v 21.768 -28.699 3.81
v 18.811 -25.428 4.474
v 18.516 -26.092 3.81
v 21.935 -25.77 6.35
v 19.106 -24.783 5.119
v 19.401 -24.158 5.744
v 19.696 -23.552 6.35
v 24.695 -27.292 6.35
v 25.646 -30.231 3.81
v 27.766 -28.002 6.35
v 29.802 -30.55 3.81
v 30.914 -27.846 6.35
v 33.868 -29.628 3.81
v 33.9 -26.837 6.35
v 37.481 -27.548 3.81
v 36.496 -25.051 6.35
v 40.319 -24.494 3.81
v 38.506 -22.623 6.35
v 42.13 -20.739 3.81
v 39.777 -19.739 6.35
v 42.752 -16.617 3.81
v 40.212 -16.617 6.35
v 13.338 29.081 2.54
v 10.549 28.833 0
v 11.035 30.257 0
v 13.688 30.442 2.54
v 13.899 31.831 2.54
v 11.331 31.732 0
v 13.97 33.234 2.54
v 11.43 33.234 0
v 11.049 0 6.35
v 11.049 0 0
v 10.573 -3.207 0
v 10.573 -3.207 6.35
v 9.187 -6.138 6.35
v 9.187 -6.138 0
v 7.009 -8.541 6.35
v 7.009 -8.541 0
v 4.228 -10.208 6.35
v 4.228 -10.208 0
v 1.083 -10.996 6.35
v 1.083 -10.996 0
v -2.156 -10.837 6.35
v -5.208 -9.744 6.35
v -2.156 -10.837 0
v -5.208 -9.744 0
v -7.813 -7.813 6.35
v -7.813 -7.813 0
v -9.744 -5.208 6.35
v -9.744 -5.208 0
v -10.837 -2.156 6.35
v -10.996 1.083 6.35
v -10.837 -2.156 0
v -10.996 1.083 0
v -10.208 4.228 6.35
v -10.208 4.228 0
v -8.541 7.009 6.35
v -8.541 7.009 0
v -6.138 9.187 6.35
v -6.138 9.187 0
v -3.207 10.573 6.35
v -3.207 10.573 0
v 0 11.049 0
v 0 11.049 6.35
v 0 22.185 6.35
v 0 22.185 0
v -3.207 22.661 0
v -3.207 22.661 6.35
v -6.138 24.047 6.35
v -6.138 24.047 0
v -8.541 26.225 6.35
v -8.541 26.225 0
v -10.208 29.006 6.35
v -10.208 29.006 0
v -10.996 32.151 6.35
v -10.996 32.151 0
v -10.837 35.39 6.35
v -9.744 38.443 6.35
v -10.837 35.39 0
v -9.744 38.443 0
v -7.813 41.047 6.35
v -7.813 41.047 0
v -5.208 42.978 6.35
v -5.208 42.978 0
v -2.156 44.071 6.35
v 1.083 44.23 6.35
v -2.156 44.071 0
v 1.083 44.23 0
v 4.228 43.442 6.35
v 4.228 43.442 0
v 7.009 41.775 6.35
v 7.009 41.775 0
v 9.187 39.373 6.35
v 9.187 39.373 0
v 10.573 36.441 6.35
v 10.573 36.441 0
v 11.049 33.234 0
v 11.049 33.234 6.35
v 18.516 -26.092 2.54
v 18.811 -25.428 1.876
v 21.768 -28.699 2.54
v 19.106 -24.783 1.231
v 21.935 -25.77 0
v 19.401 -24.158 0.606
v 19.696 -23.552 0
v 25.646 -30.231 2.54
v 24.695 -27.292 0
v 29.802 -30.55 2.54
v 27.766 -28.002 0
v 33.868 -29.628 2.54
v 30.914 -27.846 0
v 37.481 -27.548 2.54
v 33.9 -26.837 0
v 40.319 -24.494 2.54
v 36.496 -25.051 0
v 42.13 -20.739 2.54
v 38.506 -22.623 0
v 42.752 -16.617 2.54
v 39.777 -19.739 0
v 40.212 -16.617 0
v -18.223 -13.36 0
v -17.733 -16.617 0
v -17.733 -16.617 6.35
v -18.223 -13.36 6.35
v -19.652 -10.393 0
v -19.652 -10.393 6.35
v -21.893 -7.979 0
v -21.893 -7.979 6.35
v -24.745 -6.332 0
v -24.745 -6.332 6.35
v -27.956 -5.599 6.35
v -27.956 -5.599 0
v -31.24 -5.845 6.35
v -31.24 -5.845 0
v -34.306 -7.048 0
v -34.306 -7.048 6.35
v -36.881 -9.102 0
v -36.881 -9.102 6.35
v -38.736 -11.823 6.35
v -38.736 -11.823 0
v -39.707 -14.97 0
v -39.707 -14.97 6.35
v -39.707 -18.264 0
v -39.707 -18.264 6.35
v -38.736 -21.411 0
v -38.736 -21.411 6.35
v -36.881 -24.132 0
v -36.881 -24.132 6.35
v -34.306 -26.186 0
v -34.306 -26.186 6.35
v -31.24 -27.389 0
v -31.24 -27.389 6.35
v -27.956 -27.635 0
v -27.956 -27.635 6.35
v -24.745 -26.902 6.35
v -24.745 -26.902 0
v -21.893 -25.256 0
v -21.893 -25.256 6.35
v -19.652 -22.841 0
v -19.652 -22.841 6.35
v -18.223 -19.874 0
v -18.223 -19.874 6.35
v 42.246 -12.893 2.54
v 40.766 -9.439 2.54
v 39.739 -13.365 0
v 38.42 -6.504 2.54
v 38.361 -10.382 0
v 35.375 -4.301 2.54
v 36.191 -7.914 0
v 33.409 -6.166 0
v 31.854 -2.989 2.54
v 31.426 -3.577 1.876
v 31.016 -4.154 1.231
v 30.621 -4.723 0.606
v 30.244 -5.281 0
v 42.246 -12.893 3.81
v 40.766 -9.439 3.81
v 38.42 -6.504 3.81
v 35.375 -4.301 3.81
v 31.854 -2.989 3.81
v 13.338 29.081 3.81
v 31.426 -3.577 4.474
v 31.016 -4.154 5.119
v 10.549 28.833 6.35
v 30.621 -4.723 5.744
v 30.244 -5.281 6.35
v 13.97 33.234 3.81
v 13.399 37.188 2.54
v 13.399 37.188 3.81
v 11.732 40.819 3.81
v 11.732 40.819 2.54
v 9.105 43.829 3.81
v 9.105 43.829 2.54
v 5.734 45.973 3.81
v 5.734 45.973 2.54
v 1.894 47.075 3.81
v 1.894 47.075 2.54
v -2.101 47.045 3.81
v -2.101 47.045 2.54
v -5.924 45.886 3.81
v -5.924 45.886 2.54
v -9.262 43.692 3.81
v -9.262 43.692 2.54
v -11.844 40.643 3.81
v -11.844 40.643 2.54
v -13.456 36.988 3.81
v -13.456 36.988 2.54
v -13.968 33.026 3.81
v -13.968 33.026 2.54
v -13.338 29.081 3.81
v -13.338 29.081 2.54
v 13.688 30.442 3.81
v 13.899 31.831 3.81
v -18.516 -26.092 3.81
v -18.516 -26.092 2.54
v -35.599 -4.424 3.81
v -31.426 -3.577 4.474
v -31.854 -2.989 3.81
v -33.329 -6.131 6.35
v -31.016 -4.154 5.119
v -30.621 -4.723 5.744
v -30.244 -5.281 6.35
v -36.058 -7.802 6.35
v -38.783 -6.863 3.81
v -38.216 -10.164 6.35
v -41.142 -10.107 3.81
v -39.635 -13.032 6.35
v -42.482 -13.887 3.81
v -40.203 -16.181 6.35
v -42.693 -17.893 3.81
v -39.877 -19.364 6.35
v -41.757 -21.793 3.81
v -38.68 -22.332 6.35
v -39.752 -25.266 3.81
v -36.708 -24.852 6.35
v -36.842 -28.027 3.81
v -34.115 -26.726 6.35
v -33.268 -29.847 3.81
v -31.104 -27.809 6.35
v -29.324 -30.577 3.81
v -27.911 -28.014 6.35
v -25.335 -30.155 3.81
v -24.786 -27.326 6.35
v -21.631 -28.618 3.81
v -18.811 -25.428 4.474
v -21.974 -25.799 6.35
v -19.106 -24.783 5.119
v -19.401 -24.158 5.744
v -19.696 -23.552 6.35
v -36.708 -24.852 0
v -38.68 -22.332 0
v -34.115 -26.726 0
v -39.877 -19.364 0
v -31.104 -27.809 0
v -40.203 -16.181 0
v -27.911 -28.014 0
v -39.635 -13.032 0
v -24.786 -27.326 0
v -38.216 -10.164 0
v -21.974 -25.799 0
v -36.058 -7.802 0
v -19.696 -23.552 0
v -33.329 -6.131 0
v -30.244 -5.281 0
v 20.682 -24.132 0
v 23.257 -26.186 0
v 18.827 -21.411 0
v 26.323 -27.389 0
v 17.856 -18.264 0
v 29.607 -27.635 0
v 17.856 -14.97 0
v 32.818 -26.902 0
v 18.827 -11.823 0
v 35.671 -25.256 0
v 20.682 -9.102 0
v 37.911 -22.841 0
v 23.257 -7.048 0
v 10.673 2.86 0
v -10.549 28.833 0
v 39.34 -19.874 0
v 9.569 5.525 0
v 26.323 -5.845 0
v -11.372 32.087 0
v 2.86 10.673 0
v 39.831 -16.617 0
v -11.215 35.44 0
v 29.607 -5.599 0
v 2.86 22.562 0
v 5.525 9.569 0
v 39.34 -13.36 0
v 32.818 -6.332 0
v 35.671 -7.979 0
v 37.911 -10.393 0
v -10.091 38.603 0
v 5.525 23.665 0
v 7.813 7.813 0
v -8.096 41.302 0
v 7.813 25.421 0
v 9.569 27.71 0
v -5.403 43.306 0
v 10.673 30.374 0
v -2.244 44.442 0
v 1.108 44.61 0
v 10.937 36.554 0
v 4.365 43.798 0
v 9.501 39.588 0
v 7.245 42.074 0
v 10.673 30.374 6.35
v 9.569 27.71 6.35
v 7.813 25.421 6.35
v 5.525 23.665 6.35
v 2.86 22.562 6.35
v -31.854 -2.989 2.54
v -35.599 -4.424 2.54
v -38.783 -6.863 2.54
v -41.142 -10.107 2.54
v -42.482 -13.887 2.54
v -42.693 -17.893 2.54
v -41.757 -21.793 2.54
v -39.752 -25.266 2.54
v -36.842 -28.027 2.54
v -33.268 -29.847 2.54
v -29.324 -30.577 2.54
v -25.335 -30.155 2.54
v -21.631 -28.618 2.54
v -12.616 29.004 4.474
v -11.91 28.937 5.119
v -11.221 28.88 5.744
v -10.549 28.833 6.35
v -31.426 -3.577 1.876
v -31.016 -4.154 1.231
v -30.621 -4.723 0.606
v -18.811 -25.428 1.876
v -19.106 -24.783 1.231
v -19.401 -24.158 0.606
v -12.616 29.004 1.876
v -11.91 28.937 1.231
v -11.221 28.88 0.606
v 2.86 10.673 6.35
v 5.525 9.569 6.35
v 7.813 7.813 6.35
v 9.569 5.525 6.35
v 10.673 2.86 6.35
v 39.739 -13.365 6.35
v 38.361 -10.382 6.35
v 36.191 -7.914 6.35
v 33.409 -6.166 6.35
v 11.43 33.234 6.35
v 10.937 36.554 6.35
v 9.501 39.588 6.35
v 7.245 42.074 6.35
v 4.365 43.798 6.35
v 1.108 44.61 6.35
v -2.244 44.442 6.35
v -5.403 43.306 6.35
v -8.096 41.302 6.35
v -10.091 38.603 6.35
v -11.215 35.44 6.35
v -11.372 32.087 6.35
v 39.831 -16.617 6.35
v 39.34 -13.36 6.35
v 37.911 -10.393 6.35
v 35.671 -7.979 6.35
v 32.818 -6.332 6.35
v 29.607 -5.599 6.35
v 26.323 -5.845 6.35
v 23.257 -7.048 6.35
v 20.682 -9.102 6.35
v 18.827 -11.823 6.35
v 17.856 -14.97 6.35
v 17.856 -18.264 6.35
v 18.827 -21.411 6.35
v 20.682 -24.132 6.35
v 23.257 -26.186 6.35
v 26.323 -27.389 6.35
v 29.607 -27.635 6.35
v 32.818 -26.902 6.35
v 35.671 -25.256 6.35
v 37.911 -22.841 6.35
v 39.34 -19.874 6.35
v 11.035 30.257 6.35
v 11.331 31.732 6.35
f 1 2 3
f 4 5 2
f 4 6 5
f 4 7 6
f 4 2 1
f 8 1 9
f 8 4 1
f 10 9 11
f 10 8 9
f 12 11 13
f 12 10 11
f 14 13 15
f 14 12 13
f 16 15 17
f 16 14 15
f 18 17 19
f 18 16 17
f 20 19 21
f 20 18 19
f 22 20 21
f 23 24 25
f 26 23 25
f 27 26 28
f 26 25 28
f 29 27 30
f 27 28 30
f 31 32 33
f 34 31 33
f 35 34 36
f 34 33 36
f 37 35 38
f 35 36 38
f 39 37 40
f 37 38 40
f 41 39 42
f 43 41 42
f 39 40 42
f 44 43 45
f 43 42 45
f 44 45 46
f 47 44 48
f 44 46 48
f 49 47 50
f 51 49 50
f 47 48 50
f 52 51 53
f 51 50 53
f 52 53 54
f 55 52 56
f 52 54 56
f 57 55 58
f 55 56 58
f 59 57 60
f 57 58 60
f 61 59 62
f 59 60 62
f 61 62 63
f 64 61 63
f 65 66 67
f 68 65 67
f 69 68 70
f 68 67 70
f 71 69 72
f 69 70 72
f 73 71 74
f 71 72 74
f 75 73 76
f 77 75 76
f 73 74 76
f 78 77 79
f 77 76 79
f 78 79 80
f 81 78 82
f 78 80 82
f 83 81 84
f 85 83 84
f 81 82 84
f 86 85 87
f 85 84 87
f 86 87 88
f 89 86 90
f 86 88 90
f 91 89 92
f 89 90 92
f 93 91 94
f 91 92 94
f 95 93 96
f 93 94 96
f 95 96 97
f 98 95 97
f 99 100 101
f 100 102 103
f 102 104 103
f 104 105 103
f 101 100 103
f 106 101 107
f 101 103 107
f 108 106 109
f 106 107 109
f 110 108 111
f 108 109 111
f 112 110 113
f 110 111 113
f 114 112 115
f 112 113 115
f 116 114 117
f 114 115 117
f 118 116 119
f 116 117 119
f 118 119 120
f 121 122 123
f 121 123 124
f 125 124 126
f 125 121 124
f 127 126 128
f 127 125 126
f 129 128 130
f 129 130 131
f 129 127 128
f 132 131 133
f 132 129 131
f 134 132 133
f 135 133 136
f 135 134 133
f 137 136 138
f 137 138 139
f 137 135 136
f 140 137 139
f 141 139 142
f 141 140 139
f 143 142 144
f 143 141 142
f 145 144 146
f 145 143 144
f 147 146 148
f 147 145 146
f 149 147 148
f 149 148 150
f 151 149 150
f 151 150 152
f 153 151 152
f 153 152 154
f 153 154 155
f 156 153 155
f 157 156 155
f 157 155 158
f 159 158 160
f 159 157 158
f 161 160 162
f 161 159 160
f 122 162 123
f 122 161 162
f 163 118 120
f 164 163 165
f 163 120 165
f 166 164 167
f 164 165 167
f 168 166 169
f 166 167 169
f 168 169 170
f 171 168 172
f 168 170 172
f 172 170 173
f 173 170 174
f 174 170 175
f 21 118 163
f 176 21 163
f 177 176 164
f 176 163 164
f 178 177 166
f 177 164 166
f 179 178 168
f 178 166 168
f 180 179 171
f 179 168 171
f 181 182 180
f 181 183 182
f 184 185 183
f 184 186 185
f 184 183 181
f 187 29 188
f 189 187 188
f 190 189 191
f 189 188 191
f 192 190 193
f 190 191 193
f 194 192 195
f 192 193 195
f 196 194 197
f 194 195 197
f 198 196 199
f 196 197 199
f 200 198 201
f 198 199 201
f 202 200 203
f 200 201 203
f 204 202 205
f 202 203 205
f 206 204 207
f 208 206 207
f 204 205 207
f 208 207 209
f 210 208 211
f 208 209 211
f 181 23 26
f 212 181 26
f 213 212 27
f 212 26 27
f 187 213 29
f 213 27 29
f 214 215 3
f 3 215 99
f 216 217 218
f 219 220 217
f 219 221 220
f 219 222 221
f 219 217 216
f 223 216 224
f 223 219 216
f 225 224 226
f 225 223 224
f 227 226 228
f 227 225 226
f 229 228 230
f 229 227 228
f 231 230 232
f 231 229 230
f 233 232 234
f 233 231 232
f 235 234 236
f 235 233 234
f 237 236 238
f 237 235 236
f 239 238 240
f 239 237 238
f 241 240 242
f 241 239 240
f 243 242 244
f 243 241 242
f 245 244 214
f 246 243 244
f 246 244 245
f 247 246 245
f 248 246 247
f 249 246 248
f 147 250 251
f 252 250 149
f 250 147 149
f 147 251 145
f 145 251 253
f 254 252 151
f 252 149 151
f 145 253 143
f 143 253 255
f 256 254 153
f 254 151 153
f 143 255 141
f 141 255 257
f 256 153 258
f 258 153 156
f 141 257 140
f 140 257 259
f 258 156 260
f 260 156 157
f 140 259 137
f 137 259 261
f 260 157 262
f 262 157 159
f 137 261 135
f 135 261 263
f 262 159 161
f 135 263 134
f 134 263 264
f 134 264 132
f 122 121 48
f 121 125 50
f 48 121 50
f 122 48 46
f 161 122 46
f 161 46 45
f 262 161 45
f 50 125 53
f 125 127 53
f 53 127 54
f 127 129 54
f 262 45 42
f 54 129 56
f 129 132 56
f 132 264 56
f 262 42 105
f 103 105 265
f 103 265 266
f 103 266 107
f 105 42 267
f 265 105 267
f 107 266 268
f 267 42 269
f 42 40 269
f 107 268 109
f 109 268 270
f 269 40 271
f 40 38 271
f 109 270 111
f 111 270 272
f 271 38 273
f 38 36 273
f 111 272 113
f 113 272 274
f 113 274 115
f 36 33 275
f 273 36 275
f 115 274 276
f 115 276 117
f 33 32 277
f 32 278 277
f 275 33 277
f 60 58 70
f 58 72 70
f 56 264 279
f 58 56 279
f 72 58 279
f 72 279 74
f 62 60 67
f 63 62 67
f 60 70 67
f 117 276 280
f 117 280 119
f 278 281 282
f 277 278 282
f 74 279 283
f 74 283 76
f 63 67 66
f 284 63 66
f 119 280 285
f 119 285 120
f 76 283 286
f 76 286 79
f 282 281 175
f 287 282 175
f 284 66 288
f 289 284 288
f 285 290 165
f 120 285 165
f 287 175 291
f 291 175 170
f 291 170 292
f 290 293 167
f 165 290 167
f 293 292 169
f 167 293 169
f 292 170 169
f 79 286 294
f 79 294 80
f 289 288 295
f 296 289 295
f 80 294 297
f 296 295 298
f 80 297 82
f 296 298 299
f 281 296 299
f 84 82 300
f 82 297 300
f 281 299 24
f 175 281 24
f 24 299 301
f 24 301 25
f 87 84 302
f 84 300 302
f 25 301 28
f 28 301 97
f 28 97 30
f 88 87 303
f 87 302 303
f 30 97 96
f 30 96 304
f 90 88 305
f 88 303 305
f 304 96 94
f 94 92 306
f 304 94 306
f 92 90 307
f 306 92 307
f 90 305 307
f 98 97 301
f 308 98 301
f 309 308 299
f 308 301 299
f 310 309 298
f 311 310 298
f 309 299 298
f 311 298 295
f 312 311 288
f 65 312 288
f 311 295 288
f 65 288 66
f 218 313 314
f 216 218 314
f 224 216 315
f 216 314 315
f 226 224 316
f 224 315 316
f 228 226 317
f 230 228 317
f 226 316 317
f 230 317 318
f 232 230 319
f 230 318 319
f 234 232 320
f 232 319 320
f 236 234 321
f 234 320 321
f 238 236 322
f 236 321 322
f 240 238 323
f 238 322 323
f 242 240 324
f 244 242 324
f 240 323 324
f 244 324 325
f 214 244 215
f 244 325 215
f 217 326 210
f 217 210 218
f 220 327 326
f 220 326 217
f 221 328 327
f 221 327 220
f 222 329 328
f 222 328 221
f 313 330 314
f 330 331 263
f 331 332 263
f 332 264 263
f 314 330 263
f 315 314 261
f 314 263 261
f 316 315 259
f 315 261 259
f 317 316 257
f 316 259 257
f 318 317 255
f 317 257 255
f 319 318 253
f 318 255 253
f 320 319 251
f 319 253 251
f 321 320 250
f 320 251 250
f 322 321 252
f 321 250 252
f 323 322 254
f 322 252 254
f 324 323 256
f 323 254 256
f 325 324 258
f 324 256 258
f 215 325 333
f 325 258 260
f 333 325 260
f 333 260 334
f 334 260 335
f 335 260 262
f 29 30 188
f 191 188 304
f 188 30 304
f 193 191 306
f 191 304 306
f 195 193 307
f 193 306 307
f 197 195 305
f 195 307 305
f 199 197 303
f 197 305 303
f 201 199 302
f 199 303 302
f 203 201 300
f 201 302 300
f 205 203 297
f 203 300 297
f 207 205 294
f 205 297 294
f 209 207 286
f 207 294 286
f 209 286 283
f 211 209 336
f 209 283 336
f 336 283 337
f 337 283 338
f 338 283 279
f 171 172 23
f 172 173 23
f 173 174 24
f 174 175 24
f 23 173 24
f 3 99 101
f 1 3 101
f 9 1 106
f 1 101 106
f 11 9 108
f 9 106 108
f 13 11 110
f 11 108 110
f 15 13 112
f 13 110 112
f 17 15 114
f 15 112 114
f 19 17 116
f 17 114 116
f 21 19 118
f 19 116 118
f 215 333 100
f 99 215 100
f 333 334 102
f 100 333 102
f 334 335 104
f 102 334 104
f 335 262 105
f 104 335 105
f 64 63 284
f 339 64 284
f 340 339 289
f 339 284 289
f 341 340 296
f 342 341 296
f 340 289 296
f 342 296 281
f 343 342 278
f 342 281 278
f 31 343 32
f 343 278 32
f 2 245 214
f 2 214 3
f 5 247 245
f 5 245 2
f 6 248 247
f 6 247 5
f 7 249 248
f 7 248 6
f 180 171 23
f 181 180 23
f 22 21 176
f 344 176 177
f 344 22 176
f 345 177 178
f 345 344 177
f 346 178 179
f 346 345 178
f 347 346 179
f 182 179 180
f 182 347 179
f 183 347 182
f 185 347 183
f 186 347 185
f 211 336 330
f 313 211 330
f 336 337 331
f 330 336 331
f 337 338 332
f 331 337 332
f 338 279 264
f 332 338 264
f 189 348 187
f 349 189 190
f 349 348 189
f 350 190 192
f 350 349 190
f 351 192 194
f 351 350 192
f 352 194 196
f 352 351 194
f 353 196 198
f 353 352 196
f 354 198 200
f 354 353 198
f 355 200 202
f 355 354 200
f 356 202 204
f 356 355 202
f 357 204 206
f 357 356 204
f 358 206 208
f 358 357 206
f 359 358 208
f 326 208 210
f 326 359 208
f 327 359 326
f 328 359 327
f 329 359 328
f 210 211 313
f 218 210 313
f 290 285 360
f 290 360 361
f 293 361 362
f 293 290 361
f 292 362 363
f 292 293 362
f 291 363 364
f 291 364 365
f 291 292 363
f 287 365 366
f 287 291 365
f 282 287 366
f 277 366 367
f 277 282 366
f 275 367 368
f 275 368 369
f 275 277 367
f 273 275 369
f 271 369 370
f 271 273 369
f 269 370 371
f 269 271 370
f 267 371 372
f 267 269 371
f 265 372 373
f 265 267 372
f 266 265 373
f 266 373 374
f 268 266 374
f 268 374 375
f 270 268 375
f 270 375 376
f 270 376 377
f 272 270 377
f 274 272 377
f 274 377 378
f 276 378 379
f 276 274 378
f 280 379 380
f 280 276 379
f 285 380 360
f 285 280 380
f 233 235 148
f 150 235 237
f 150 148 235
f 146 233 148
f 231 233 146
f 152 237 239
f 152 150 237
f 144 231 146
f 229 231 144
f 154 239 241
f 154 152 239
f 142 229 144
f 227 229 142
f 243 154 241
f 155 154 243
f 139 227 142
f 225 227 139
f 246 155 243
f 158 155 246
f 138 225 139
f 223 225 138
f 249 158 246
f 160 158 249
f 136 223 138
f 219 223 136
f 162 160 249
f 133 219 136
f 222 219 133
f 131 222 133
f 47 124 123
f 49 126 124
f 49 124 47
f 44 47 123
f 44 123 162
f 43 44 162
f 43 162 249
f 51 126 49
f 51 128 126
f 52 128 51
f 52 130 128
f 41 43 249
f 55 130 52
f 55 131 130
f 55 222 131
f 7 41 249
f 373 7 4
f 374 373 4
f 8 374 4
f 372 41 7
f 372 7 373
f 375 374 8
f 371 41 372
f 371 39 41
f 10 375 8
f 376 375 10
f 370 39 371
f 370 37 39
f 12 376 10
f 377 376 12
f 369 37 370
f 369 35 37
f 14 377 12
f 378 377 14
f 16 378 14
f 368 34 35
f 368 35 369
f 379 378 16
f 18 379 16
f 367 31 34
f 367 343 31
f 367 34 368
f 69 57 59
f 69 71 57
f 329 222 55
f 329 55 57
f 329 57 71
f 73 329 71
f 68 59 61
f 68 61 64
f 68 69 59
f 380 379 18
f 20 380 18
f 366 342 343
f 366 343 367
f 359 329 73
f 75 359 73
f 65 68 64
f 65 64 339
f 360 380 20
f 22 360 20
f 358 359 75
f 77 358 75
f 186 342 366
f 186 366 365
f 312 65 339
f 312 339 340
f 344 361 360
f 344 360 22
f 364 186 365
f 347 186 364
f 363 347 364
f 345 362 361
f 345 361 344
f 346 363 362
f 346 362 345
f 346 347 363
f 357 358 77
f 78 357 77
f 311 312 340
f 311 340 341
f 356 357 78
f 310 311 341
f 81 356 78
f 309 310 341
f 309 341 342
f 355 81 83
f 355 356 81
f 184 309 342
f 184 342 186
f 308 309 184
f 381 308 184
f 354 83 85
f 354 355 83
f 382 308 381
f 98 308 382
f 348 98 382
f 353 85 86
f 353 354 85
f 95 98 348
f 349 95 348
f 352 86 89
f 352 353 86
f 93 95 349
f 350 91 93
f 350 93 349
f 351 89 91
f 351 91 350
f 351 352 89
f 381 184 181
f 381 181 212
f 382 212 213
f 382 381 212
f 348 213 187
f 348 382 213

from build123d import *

# Parameters (mm, degrees)
F0_R     = 11.049
F1_DEPTH = 6.35
F2_SIZE  = 2.54
F3_DEPTH = 6.35


with BuildPart() as f1:
    # F0 (on Top) → F1 (new body)
    with BuildSketch(Plane.XY):
        with BuildLine():
            ThreePointArc((0, 11.049), (-7.812823, -7.812823), (11.049, 0))
            ThreePointArc((11.049, 0), (7.812823, 7.812823), (0, 11.049))
        make_face()
        with BuildLine():
            ThreePointArc((13.97, 0), (9.878282, 9.878282), (0, 13.97))
            ThreePointArc((0, 13.97), (-9.878282, -9.878282), (13.97, 0))
        make_face()
        with BuildLine():
            ThreePointArc((0, 11.049), (7.812823, 7.812823), (11.049, 0))
            ThreePointArc((11.049, 0), (-7.812823, -7.812823), (0, 11.049))
        make_face(mode=Mode.SUBTRACT)
        with BuildLine():
            ThreePointArc((13.338323, 29.080812), (8.280673, 21.982845), (0, 19.264128))
            ThreePointArc((0, 19.264128), (-8.280673, 21.982845), (-13.338323, 29.080812))
            ThreePointArc((-13.338323, 29.080812), (-15.574662, 8.992035), (-31.853884, -2.989079))
            ThreePointArc((-31.853884, -2.989079), (-20.05689, -5.706502), (-14.811599, -16.617064))
            ThreePointArc((-14.811599, -16.617064), (-15.770499, -21.703533), (-18.51556, -26.091733))
            ThreePointArc((-18.51556, -26.091733), (0, -17.984071), (18.51556, -26.091733))
            ThreePointArc((18.51556, -26.091733), (16.683224, -9.632064), (31.853884, -2.989079))
            ThreePointArc((31.853884, -2.989079), (15.574662, 8.992035), (13.338323, 29.080812))
        make_face()
        with BuildLine():
            ThreePointArc((13.97, 0), (-9.878282, -9.878282), (0, 13.97))
            ThreePointArc((0, 13.97), (9.878282, 9.878282), (13.97, 0))
        make_face(mode=Mode.SUBTRACT)
        with BuildLine():
            ThreePointArc((11.049, 33.234128), (-7.812823, 41.046951), (0, 22.185128))
            ThreePointArc((0, 22.185128), (7.812823, 25.421305), (11.049, 33.234128))
        make_face()
        with BuildLine():
            ThreePointArc((-13.338323, 29.080812), (-8.280673, 21.982845), (0, 19.264128))
            ThreePointArc((0, 19.264128), (8.280673, 21.982845), (13.338323, 29.080812))
            ThreePointArc((13.338323, 29.080812), (13.811178, 31.133589), (13.97, 33.234128))
            ThreePointArc((13.97, 33.234128), (-2.100538, 47.045306), (-13.338323, 29.080812))
        make_face()
        with BuildLine():
            ThreePointArc((11.049, 33.234128), (7.812823, 25.421305), (0, 22.185128))
            ThreePointArc((0, 22.185128), (-7.812823, 41.046951), (11.049, 33.234128))
        make_face(mode=Mode.SUBTRACT)
        with BuildLine():
            ThreePointArc((-31.853884, -2.989079), (-15.574662, 8.992035), (-13.338323, 29.080812))
            Line((-13.338323, 29.080812), (-31.853884, -2.989079))
        make_face()
        with BuildLine():
            Line((31.853884, -2.989079), (13.338323, 29.080812))
            ThreePointArc((13.338323, 29.080812), (15.574662, 8.992035), (31.853884, -2.989079))
        make_face()
        with BuildLine():
            ThreePointArc((-14.811599, -16.617064), (-20.05689, -5.706502), (-31.853884, -2.989079))
            ThreePointArc((-31.853884, -2.989079), (-40.879974, -23.602064), (-18.51556, -26.091733))
            ThreePointArc((-18.51556, -26.091733), (-15.770499, -21.703533), (-14.811599, -16.617064))
        make_face()
        with Locations((-28.781599, -16.617064)):
            Circle(F0_R, mode=Mode.SUBTRACT)
        with BuildLine():
            ThreePointArc((42.751599, -16.617064), (39.692161, -7.892355), (31.853884, -2.989079))
            ThreePointArc((31.853884, -2.989079), (16.683224, -9.632064), (18.51556, -26.091733))
            ThreePointArc((18.51556, -26.091733), (33.868068, -29.628164), (42.751599, -16.617064))
        make_face()
        with Locations((28.781599, -16.617064)):
            Circle(F0_R, mode=Mode.SUBTRACT)
        with BuildLine():
            ThreePointArc((18.51556, -26.091733), (0, -17.984071), (-18.51556, -26.091733))
            Line((-18.51556, -26.091733), (18.51556, -26.091733))
        make_face()
    extrude(amount=F1_DEPTH)

    # F2
    f2_edges = [f1.edges().sort_by_distance(p)[0] for p in [
        (0, -26.091733, 6.35),
        (-22.596104, 13.045866, 6.35),
        (22.596104, 13.045866, 6.35),
        (-40.879974, -23.602064, 6.35),
        (40.879974, -23.602064, 6.35),
        (0, 47.204128, 6.35),
        (0, 47.204128, 0),
        (-22.596104, 13.045866, 0),
        (-40.879974, -23.602064, 0),
        (0, -26.091733, 0),
        (40.879974, -23.602064, 0),
        (22.596104, 13.045866, 0),
    ]]
    chamfer(f2_edges, length=F2_SIZE)

    # F0 (on Top) → F3 (join)
    with BuildSketch(Plane.XY):
        with BuildLine():
            ThreePointArc((13.97, 0), (9.878282, 9.878282), (0, 13.97))
            ThreePointArc((0, 13.97), (-9.878282, -9.878282), (13.97, 0))
        make_face()
        with BuildLine():
            ThreePointArc((0, 11.049), (7.812823, 7.812823), (11.049, 0))
            ThreePointArc((11.049, 0), (-7.812823, -7.812823), (0, 11.049))
        make_face(mode=Mode.SUBTRACT)
    extrude(amount=F3_DEPTH)


solid = f1.part
